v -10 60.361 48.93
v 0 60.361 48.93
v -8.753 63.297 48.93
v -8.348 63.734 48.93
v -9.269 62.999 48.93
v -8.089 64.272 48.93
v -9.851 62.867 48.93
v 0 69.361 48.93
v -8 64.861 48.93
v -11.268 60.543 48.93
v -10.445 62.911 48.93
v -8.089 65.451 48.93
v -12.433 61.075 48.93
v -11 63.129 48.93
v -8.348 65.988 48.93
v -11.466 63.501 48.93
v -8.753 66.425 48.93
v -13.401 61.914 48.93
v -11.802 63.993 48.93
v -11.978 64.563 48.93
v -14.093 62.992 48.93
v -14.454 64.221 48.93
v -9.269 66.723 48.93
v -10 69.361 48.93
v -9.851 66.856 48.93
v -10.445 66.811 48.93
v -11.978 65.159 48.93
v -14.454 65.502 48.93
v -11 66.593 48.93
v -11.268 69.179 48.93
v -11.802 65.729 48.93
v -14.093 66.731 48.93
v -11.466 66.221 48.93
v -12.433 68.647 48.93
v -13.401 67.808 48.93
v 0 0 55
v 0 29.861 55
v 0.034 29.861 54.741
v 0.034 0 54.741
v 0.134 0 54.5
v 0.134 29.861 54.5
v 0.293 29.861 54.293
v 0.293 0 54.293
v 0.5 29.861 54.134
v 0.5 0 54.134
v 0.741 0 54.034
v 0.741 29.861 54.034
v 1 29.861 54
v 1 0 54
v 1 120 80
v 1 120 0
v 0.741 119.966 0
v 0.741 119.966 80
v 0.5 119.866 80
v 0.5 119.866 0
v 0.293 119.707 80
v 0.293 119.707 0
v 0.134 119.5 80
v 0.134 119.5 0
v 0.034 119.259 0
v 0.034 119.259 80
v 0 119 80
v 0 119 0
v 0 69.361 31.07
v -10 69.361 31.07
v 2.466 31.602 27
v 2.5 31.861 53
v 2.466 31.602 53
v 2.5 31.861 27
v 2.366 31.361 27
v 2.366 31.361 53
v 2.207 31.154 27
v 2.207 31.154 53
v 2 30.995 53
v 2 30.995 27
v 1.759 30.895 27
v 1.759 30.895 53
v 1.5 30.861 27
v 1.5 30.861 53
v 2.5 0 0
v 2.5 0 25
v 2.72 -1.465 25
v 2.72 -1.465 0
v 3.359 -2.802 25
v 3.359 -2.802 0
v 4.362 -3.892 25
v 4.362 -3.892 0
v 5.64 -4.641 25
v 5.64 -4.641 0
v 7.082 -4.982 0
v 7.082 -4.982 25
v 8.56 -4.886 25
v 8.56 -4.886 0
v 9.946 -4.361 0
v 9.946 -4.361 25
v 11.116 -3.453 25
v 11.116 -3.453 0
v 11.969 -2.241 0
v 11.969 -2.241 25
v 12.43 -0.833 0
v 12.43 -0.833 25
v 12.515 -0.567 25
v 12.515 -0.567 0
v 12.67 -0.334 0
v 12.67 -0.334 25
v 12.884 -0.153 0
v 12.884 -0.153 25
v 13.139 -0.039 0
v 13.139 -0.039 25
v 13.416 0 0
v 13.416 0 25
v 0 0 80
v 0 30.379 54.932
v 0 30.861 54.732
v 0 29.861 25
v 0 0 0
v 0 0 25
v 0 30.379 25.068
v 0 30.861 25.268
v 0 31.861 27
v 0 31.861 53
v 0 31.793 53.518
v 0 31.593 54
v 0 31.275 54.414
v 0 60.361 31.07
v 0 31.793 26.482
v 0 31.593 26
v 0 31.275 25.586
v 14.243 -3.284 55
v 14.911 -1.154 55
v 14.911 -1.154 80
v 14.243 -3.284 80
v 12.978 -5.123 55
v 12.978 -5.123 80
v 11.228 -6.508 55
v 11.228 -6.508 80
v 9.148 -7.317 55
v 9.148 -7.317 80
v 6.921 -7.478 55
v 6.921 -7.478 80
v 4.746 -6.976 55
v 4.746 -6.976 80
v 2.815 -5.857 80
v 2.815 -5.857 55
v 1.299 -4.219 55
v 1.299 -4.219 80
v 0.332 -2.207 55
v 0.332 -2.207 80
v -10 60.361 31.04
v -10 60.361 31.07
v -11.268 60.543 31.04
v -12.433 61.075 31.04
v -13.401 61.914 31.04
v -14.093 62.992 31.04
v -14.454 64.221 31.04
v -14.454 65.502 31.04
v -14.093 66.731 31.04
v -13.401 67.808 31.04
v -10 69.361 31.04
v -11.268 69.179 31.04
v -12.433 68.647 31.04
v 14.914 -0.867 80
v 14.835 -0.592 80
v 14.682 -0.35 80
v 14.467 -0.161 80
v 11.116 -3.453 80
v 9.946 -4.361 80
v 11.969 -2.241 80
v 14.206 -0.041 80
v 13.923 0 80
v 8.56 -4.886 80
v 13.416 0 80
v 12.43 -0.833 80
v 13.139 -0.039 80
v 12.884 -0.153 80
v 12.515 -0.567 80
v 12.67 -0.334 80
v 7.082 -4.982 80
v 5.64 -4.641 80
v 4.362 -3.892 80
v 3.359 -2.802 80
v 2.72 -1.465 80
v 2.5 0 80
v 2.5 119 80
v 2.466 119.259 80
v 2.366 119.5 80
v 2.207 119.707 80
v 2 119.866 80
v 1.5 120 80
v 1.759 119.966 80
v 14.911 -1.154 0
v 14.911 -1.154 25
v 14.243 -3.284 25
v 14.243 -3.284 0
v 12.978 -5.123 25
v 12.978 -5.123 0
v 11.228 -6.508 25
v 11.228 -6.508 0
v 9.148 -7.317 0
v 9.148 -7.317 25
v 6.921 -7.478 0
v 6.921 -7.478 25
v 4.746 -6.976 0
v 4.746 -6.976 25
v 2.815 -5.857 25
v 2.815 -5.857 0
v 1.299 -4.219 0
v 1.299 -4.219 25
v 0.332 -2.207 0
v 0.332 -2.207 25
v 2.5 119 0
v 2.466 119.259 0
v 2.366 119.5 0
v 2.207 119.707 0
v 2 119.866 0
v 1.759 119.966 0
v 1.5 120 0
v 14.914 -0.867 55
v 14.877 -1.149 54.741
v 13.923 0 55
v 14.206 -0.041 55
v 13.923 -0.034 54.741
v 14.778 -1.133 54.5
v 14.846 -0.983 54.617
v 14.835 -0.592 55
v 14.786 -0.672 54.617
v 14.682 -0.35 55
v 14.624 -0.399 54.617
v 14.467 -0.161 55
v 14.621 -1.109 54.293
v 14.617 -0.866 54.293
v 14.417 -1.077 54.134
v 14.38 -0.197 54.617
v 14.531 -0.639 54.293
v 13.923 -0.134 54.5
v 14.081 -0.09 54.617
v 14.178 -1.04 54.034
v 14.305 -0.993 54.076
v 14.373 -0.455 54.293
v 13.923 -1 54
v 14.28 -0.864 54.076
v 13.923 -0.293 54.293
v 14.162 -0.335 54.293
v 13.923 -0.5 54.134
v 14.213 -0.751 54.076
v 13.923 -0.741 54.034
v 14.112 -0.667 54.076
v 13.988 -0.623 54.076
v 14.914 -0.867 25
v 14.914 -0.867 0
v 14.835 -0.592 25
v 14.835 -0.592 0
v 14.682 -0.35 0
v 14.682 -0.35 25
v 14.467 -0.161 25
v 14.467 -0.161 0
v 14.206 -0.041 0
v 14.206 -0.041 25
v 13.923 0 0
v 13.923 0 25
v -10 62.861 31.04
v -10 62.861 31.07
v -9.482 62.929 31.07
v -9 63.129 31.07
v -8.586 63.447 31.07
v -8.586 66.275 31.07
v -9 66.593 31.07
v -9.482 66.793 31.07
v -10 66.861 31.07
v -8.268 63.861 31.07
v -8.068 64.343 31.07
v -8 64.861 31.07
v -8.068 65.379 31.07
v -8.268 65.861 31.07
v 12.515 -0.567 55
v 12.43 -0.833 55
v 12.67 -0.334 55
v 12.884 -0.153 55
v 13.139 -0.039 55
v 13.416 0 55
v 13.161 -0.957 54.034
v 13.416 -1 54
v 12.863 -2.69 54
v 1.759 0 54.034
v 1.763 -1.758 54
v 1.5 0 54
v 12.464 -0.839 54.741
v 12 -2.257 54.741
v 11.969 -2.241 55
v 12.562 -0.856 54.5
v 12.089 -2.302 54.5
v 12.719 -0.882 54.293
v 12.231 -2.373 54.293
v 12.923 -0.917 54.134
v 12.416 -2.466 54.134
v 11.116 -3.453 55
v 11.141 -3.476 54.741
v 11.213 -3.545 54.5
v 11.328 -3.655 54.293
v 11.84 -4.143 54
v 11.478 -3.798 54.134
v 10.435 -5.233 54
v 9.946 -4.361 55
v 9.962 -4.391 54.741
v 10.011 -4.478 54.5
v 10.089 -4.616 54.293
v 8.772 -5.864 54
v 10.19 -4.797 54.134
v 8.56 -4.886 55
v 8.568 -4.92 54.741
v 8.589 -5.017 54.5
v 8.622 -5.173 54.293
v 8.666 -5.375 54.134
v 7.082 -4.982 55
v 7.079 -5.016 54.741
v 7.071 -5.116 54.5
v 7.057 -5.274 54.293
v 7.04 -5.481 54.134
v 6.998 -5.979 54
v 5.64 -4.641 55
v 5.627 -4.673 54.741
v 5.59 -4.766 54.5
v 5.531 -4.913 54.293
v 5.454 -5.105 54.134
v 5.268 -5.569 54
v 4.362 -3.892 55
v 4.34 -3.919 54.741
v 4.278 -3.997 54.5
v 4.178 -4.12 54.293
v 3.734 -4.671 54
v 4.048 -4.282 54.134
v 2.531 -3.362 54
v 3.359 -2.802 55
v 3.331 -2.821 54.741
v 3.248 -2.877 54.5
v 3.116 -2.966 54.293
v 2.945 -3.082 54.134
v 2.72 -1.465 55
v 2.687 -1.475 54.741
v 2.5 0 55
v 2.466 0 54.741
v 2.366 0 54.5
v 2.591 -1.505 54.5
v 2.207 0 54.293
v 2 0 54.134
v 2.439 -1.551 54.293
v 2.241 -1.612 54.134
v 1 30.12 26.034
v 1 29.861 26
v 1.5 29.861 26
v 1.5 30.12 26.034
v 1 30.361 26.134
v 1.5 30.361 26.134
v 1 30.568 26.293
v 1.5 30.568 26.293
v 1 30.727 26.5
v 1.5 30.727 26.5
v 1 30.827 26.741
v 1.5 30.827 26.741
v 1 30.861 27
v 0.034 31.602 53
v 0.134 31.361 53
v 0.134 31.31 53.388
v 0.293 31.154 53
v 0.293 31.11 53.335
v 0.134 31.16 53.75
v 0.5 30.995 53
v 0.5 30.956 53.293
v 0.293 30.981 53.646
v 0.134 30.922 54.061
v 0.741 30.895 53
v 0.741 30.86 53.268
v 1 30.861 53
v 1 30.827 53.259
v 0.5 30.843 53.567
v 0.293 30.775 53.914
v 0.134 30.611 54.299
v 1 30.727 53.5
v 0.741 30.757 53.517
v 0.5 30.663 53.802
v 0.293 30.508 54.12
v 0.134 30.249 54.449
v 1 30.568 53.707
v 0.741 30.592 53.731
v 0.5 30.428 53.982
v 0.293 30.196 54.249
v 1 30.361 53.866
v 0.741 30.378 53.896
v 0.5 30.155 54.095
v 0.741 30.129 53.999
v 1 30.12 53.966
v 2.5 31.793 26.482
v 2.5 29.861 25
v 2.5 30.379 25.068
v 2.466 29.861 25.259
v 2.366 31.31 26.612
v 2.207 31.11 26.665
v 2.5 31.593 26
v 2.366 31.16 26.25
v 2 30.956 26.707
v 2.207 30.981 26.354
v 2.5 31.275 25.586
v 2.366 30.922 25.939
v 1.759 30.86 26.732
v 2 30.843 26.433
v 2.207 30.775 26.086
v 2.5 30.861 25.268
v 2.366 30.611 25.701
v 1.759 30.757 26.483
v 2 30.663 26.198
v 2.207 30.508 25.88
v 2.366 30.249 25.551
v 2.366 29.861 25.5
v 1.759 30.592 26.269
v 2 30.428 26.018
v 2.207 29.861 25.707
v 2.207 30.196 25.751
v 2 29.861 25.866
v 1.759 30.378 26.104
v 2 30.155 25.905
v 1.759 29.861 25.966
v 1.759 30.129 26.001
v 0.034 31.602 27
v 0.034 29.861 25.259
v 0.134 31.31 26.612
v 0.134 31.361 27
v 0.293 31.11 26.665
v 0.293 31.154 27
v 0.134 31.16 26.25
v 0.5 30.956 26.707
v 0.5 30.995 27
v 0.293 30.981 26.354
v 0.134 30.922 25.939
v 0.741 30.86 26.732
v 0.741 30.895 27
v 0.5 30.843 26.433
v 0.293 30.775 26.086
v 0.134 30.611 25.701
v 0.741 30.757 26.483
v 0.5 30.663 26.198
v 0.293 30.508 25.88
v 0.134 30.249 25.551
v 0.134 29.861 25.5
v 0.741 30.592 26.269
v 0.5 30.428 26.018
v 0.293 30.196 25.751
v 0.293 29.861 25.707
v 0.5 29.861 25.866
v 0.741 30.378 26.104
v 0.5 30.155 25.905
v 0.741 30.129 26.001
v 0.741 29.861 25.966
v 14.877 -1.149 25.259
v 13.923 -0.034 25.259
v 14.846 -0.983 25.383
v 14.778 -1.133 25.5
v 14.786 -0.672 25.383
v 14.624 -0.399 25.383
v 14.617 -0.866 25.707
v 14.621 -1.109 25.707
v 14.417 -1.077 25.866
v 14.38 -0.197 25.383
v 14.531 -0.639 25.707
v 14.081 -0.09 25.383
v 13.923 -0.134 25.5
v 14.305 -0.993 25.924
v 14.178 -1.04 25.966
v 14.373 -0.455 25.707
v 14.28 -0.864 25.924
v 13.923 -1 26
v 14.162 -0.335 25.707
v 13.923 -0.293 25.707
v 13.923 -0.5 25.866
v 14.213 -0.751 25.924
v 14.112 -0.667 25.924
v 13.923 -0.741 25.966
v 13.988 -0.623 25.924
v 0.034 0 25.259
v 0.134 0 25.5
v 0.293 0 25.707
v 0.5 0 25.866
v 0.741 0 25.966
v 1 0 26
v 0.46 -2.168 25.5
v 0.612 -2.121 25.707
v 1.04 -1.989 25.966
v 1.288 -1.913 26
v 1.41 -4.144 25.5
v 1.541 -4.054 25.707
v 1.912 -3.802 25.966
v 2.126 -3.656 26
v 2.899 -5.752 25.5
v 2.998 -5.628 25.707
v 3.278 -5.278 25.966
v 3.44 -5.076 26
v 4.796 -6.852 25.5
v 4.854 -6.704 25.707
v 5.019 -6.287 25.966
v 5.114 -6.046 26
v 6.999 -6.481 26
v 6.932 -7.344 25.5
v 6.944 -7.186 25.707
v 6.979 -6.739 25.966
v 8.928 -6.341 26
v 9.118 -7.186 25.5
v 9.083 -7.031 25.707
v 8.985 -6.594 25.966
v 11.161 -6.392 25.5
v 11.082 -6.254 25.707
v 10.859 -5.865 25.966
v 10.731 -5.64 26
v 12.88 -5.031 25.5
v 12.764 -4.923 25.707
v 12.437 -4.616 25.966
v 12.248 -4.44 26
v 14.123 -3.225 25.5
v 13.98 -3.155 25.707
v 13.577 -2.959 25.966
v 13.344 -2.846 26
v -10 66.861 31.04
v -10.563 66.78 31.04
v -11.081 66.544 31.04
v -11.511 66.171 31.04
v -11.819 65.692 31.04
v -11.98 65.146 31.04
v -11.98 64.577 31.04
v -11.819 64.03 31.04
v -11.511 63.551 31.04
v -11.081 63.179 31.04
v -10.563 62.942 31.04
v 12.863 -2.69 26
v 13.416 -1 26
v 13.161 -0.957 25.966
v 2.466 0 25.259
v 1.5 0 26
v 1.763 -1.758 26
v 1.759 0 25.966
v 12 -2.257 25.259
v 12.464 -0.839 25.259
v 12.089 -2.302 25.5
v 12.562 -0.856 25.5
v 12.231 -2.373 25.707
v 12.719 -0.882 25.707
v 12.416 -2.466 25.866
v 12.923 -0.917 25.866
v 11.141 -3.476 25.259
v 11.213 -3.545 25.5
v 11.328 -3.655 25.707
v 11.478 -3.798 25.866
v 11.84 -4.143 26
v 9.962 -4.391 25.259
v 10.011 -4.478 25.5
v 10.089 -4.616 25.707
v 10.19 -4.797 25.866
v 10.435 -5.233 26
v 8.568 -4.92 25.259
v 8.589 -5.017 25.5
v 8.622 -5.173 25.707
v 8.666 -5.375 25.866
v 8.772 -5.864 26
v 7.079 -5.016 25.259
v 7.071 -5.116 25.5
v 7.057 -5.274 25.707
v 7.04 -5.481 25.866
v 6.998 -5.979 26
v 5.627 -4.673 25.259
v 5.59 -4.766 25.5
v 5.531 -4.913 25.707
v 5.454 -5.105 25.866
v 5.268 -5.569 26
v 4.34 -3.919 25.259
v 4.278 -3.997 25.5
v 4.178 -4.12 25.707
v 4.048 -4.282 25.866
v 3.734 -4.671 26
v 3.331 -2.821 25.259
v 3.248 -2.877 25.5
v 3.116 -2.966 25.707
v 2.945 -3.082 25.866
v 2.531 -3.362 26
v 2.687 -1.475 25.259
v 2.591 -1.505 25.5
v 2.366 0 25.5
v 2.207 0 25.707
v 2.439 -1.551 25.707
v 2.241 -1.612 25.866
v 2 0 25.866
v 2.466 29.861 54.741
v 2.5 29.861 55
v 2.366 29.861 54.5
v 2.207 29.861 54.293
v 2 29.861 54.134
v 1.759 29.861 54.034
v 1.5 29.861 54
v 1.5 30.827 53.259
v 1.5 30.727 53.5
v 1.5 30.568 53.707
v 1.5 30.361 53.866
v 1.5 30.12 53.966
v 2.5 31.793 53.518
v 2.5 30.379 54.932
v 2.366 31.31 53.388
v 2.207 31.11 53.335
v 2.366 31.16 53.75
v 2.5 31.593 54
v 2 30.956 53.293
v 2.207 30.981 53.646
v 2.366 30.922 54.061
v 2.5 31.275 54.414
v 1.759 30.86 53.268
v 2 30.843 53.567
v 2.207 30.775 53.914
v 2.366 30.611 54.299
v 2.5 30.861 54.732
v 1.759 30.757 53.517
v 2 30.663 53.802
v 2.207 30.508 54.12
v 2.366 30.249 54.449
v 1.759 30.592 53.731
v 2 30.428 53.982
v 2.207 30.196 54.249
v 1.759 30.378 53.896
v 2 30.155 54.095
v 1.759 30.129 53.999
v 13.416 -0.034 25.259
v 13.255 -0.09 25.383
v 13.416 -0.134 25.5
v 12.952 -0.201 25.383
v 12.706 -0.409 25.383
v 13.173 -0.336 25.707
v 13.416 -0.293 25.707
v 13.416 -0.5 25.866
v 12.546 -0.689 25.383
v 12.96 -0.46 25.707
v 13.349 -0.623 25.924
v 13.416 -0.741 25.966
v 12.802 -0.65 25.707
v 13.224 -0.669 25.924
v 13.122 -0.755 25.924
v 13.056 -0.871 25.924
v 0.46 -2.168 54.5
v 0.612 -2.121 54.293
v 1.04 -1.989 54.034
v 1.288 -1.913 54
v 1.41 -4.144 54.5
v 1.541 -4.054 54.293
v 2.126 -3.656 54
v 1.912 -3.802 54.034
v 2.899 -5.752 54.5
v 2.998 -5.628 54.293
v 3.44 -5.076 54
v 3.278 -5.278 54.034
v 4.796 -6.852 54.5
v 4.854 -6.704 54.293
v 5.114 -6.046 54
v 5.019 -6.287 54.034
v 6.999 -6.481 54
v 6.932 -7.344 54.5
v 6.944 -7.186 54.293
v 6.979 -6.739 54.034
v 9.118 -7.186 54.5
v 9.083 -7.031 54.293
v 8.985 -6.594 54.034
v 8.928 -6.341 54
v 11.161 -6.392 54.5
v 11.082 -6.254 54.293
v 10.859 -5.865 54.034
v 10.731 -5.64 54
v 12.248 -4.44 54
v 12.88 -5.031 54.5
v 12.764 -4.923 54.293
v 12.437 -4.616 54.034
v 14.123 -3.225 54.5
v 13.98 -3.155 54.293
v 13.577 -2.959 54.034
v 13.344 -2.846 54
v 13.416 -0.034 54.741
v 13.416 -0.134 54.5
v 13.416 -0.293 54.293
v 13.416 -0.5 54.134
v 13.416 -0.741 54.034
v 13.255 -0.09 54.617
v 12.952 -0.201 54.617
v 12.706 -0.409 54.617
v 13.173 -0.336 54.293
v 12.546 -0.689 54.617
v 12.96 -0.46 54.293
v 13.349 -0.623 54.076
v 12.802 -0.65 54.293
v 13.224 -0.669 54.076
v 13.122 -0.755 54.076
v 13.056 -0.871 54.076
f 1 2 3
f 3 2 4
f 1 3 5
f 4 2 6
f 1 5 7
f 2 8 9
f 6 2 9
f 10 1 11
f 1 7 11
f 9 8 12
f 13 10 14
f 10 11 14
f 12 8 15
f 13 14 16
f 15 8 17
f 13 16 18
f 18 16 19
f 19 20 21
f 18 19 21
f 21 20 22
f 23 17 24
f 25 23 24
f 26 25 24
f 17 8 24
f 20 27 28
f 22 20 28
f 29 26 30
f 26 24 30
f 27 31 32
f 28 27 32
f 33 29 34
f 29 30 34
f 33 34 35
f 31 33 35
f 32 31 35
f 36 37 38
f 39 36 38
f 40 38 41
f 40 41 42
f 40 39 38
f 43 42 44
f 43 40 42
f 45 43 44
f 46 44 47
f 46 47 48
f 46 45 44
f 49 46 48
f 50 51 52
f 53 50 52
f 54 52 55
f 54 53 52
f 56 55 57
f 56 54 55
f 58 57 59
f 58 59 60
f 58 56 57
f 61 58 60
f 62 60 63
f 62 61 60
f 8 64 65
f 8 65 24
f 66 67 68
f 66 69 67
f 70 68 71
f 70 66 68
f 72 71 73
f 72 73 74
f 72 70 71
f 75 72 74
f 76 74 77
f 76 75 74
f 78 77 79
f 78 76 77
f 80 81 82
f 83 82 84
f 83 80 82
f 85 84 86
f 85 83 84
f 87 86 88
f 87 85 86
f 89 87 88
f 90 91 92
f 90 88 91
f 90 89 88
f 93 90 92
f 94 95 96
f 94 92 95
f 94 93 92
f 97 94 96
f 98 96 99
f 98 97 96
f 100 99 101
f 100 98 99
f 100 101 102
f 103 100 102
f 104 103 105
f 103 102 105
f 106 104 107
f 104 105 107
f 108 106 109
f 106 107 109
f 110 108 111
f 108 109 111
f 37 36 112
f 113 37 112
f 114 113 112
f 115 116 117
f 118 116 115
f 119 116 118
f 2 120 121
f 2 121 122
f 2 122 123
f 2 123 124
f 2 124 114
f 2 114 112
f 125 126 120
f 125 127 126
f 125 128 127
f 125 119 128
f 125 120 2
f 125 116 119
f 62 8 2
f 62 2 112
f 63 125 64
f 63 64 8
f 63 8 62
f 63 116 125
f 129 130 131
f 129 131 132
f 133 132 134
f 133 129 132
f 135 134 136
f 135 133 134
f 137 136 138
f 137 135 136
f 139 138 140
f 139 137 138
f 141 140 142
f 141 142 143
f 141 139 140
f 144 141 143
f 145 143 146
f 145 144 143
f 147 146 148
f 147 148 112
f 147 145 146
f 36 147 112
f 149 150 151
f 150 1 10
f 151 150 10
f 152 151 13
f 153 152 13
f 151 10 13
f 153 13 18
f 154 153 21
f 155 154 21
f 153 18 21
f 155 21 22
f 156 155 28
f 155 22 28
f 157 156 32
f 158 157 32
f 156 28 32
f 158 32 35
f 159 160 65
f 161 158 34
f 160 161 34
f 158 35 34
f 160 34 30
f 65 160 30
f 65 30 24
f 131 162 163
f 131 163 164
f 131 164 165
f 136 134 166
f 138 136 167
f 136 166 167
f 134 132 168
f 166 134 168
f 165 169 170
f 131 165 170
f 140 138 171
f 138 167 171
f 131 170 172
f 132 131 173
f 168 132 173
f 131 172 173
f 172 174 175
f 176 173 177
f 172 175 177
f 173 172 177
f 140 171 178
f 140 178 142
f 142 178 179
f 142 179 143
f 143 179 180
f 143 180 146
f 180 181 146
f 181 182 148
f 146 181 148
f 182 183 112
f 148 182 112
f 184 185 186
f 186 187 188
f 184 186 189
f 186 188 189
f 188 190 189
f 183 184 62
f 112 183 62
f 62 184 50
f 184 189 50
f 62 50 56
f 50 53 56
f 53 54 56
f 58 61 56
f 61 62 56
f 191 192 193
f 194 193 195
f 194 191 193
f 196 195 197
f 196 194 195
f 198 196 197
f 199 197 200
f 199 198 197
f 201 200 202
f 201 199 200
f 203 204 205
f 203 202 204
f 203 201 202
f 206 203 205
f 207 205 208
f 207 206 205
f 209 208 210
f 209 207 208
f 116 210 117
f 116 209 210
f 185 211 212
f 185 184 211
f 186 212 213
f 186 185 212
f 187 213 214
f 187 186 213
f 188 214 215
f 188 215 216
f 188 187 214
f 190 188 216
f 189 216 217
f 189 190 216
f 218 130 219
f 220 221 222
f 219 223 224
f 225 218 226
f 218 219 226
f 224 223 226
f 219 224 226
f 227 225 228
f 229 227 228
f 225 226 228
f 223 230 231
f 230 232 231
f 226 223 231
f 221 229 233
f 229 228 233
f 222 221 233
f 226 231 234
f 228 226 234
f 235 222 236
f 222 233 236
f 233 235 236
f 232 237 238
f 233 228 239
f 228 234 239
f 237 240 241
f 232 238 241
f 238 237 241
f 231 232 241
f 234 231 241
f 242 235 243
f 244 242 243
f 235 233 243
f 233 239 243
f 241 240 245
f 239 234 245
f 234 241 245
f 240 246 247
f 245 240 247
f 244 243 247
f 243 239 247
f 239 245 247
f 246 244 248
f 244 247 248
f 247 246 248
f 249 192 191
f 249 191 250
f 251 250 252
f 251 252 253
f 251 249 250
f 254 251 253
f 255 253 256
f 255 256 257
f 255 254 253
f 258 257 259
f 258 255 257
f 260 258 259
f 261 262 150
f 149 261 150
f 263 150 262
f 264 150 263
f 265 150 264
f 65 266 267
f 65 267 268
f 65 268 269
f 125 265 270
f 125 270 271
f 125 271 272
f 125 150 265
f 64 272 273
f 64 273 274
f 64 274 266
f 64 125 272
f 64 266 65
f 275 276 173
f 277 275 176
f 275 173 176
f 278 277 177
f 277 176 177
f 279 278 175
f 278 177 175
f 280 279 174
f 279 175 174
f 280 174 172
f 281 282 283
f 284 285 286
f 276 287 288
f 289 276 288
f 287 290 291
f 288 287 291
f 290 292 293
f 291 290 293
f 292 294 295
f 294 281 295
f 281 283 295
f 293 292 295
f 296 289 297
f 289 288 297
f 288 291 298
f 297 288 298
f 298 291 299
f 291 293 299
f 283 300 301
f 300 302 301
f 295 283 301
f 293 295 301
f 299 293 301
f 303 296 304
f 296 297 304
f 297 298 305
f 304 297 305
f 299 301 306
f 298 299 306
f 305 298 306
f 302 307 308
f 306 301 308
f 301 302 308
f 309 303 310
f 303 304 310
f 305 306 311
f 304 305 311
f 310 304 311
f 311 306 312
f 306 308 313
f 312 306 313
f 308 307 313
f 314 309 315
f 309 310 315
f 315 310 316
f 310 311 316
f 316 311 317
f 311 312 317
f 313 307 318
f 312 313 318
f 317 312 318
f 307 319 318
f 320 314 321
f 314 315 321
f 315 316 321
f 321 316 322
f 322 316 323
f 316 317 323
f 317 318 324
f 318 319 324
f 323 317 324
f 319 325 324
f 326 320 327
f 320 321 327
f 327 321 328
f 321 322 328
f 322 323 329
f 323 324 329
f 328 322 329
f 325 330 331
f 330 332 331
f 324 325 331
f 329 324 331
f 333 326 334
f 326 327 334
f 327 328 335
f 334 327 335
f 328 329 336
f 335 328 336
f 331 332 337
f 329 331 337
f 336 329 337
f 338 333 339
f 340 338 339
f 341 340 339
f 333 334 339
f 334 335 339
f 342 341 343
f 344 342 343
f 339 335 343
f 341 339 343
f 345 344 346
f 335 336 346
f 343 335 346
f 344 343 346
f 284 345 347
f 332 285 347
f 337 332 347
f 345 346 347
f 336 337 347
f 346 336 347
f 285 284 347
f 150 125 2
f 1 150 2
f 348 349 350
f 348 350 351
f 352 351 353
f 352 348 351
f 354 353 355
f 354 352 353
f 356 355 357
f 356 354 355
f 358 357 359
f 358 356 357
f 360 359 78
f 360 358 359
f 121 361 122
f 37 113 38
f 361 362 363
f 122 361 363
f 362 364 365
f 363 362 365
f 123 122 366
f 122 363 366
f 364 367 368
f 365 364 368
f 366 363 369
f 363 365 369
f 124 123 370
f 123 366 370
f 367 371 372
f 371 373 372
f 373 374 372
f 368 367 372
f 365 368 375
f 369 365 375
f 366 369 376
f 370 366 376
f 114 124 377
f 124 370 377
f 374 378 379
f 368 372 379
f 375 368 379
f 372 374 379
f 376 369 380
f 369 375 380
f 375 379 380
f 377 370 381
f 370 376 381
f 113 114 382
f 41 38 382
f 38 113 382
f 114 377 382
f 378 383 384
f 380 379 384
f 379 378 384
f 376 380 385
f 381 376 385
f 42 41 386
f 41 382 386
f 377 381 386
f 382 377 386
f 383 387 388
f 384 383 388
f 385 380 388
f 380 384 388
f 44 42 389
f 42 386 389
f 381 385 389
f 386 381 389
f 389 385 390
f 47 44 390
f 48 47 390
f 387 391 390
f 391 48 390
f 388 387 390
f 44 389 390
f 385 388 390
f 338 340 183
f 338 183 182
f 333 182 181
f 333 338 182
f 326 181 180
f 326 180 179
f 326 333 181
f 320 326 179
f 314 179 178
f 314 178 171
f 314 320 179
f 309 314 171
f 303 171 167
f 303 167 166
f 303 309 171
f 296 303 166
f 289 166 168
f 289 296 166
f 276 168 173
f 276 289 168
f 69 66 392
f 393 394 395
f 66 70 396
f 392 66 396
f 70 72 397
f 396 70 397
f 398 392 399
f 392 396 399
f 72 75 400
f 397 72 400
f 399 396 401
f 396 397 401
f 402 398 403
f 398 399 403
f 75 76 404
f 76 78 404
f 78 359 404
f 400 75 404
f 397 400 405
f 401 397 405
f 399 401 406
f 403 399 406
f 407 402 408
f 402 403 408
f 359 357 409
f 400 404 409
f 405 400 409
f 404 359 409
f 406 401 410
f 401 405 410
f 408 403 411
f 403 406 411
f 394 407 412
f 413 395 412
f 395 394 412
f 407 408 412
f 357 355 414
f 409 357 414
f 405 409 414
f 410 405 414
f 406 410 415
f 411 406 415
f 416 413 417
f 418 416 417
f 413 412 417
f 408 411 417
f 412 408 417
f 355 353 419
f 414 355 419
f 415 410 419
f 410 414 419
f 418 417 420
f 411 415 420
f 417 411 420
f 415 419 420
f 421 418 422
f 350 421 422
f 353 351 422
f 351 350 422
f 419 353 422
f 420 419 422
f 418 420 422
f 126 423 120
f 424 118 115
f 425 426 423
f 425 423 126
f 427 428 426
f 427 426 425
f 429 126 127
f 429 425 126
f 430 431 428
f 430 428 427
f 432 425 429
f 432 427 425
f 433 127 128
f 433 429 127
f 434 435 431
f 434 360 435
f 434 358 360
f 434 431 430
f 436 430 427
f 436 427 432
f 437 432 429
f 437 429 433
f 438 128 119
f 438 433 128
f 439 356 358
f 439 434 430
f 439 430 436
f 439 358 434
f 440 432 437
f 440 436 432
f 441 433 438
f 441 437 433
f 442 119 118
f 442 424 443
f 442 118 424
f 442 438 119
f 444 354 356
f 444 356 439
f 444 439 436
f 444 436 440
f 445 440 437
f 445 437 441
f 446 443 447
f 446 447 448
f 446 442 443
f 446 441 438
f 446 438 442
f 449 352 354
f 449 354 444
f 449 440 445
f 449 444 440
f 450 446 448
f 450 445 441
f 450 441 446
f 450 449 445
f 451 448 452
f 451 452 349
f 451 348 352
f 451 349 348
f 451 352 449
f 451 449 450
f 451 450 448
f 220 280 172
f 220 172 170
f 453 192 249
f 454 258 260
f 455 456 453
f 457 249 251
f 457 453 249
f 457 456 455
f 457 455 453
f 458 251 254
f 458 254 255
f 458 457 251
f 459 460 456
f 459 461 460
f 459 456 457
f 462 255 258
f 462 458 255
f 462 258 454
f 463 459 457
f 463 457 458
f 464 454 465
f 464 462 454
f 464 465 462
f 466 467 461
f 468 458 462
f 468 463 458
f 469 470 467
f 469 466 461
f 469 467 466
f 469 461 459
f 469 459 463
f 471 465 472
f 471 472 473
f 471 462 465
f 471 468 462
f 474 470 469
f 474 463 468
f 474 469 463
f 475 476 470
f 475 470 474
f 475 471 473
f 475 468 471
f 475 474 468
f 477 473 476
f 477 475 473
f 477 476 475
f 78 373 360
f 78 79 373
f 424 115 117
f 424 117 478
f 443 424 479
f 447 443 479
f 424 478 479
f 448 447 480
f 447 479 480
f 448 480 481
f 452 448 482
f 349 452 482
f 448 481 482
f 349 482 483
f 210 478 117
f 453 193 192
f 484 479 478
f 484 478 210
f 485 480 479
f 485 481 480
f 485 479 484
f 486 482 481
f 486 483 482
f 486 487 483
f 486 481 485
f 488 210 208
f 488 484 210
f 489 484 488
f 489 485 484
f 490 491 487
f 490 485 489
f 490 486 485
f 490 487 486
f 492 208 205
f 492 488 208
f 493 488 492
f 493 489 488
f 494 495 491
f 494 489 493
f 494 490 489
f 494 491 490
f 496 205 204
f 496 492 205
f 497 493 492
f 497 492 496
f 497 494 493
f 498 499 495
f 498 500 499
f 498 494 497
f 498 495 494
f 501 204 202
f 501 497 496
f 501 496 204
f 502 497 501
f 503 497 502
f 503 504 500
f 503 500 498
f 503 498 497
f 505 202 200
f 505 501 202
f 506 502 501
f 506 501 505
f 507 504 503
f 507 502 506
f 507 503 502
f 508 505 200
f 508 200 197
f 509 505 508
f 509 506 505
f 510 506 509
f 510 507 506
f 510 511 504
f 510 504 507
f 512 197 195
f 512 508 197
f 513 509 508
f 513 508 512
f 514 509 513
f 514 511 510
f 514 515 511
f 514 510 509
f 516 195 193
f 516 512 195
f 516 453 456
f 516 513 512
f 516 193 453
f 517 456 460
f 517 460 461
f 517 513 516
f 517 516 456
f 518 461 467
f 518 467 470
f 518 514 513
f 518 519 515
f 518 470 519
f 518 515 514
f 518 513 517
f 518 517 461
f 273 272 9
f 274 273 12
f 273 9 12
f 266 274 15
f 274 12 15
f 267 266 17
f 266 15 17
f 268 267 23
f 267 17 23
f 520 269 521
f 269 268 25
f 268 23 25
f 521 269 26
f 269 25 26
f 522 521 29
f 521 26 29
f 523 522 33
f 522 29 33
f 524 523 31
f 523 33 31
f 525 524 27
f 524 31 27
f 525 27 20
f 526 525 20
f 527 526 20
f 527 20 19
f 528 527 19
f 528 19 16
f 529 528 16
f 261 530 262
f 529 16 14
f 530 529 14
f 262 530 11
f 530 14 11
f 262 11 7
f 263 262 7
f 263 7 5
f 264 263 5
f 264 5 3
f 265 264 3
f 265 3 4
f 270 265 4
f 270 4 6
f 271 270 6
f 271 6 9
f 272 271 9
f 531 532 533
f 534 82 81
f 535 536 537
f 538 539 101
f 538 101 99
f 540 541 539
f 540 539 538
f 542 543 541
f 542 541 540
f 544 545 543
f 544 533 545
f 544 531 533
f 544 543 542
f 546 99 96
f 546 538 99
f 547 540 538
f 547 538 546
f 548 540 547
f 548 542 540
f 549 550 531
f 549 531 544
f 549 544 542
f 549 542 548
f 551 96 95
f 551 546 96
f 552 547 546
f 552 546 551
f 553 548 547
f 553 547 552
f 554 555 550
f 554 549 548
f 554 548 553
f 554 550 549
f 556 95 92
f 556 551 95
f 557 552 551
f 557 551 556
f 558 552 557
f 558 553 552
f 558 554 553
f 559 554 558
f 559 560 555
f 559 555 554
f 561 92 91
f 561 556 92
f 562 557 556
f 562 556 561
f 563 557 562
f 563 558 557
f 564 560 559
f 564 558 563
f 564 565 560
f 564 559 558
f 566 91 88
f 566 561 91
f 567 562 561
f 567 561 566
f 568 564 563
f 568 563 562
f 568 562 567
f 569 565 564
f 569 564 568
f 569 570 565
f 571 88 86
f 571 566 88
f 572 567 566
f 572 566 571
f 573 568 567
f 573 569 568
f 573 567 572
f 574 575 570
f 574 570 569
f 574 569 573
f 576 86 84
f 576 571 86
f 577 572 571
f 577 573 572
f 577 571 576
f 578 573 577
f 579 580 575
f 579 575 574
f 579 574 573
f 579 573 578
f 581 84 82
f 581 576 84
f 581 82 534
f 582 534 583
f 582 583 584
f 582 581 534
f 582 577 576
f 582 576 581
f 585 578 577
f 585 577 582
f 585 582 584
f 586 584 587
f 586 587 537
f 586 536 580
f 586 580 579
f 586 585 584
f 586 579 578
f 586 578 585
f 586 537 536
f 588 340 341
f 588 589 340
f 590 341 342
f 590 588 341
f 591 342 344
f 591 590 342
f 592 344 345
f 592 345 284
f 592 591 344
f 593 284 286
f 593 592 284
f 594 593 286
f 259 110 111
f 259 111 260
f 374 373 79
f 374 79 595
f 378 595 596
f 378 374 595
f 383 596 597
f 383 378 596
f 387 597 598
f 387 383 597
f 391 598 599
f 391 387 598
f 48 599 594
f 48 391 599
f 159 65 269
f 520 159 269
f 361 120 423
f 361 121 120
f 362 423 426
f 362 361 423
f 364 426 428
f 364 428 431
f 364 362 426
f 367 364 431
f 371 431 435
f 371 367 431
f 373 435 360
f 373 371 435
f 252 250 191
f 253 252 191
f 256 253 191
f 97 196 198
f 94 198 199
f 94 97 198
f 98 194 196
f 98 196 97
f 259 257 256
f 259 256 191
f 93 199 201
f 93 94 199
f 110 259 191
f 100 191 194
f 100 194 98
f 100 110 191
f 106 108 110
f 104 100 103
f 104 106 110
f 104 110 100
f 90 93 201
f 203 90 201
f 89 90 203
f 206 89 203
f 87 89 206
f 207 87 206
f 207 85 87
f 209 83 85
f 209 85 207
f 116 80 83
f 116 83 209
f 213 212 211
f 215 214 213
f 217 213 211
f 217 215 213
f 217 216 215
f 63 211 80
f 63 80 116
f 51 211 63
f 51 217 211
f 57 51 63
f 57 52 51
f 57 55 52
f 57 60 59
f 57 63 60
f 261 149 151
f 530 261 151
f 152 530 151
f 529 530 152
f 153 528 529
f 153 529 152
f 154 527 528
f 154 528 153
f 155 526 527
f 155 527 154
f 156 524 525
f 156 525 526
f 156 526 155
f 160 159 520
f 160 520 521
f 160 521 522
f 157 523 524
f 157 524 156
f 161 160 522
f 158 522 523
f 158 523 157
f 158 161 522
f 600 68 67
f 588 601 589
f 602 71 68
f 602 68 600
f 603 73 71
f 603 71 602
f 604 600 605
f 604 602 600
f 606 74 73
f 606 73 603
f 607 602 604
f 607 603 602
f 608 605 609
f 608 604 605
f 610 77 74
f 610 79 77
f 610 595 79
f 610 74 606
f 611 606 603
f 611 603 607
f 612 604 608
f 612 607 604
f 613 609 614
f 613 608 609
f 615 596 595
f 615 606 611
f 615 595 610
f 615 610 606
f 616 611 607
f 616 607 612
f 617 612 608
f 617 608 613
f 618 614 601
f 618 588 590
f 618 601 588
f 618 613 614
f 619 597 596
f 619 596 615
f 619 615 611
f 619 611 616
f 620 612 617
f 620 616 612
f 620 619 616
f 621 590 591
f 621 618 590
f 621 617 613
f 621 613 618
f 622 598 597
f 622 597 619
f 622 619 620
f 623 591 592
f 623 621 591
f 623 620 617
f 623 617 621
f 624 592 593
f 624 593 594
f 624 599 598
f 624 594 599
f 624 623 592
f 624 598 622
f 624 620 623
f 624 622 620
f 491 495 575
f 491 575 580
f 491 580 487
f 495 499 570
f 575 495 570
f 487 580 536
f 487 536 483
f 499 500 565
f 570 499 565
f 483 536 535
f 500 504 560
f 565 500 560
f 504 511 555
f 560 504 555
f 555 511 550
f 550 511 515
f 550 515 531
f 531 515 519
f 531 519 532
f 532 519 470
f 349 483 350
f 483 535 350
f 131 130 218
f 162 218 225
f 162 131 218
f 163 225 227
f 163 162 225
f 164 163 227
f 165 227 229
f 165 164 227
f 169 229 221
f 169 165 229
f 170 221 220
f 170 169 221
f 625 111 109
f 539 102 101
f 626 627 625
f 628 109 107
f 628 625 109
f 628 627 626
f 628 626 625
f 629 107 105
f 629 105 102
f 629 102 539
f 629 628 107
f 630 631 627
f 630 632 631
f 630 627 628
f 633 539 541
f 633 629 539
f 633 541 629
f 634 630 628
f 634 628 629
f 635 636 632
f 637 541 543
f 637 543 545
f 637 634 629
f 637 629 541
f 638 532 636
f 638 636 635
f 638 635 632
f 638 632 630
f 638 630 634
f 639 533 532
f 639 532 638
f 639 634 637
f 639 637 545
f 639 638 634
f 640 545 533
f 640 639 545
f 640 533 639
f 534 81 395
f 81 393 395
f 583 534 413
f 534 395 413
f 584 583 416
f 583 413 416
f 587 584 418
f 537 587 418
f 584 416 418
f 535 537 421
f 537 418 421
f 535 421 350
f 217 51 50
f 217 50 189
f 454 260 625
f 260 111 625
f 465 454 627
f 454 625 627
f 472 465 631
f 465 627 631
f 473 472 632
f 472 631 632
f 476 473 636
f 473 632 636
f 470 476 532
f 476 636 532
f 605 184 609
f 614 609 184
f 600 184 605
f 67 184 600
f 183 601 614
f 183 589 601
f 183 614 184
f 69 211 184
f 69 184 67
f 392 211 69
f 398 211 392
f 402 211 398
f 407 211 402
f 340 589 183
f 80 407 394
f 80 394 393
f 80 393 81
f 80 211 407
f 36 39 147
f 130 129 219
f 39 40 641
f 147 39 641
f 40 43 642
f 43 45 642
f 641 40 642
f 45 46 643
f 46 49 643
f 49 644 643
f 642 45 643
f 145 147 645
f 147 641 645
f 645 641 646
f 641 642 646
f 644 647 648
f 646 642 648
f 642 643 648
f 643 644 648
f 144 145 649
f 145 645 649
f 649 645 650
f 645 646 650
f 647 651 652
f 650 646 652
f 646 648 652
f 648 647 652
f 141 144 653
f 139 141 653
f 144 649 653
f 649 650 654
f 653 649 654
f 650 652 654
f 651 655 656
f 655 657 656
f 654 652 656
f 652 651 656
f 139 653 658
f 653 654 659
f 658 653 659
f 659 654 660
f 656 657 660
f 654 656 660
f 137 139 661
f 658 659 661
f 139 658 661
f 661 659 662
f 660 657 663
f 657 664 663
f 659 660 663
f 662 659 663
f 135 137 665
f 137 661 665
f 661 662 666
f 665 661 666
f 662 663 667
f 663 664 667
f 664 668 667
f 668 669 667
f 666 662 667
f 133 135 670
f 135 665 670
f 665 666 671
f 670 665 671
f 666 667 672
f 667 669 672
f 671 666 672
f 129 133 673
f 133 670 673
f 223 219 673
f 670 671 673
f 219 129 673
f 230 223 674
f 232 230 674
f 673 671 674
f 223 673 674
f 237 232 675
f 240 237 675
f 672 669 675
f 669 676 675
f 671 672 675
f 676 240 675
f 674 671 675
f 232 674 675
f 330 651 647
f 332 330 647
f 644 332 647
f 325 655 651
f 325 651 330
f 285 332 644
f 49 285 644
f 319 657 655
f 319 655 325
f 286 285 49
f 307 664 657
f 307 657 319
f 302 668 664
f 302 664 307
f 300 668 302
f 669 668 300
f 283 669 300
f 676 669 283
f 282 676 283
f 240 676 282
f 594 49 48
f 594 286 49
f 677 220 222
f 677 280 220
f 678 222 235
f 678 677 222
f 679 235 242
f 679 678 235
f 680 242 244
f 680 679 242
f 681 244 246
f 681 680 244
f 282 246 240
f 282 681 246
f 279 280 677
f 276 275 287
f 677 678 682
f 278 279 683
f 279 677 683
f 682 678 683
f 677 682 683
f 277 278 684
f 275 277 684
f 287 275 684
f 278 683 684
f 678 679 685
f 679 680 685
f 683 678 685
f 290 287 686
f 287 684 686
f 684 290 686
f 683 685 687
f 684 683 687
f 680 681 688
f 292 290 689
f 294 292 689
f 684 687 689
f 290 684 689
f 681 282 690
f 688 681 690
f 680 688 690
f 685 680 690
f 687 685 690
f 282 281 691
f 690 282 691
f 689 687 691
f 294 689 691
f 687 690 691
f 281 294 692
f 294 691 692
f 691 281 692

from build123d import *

# Parameters (mm, degrees)
EXTRUDE_1_DEPTH     = 80
SKETCH_2_W          = 28
SKETCH_2_H          = 76.722275626
CUT_EXTRUDE_2_DEPTH = 40
FILLET_1_R          = 1
FILLET_2_R          = 1
FILLET_3_R          = 1
SKETCH_4_W          = 17.86
SKETCH_4_H          = 9
EXTRUDE_2_DEPTH     = 10
EXTRUDE_3_DEPTH     = 17.89
SKETCH_6_R          = 2
CUT_EXTRUDE_3_DEPTH = 131.448569854


with BuildPart() as part:
    # 草图1 → 凸台-拉伸1 (new body)
    with BuildSketch(Plane.XY):
        with BuildLine():
            Line((0, 0), (0, 120))
            Line((0, 120), (2.5, 120))
            Line((2.5, 120), (2.5, 0))
            ThreePointArc((2.5, 0), (7.5, -5), (12.5, 0))
            Line((12.5, 0), (15, 0))
            ThreePointArc((15, 0), (7.5, -7.5), (0, 0))
        make_face()
    extrude(amount=EXTRUDE_1_DEPTH)

    # 草图2 → 切除-拉伸2 (cut, symmetric)
    with BuildSketch(Plane(origin=(2.5, 0, 0), x_dir=(0, 0, -1), z_dir=(1, 0, 0))):
        with Locations((-40, -7.5)):
            Rectangle(SKETCH_2_W, SKETCH_2_H)
    extrude(amount=CUT_EXTRUDE_2_DEPTH, both=True, mode=Mode.SUBTRACT)

    # 圆角1
    fillet_1_edges = [part.edges().sort_by_distance(p)[0] for p in [
        (12.5, 0, 67),
        (15, 0, 67),
        (12.5, 0, 13),
        (15, 0, 13),
    ]]
    fillet(fillet_1_edges, radius=FILLET_1_R)

    # 圆角2
    fillet_2_edges = [part.edges().sort_by_distance(p)[0] for p in [
        (0, 120, 40),
        (2.5, 120, 40),
    ]]
    fillet(fillet_2_edges, radius=FILLET_2_R)

    # 圆角3
    fillet_3_edges = [part.edges().sort_by_distance(p)[0] for p in [
        (0, 30.861137813, 40),
        (0, 15.430568906, 54),
        (0, 15.430568906, 26),
        (1.25, 30.861137813, 26),
        (2.5, 15.430568906, 26),
        (7.081868699, -4.982485947, 26),
        (2.5, 15.430568906, 54),
        (6.921352125, -7.477644458, 54),
        (1.25, 30.861137813, 54),
        (2.5, 30.861137813, 40),
        (13.669348036, 0, 26),
        (6.921352125, -7.477644458, 26),
        (14.682170815, -0.349556364, 26),
        (12.770582559, -0.236237384, 26),
        (7.081868699, -4.982485947, 54),
        (13.669348036, 0, 54),
        (14.682170815, -0.349556364, 54),
        (12.770582559, -0.236237384, 54),
    ]]
    fillet(fillet_3_edges, radius=FILLET_3_R)

    # 草图4 → 凸台-拉伸2 (add)
    with BuildSketch(Plane.ZY):
        with Locations((40, 64.861137813)):
            Rectangle(SKETCH_4_W, SKETCH_4_H)
    extrude(amount=EXTRUDE_2_DEPTH)

    # 草图5 → 凸台-拉伸3 (add)
    with BuildSketch(Plane.XY.offset(48.93)):
        with BuildLine():
            Line((-10, 69.361137813), (-10, 60.361137813))
            ThreePointArc((-10, 60.361137813), (-14.5, 64.861137813), (-10, 69.361137813))
        make_face()
    extrude(amount=-EXTRUDE_3_DEPTH)

    # 草图6 → 切除-拉伸3 (cut, through all)
    with BuildSketch(Plane.XY.offset(48.93)):
        with Locations((-10, 64.861137813)):
            Circle(SKETCH_6_R)
    extrude(amount=-CUT_EXTRUDE_3_DEPTH, mode=Mode.SUBTRACT)


solid = part.part
